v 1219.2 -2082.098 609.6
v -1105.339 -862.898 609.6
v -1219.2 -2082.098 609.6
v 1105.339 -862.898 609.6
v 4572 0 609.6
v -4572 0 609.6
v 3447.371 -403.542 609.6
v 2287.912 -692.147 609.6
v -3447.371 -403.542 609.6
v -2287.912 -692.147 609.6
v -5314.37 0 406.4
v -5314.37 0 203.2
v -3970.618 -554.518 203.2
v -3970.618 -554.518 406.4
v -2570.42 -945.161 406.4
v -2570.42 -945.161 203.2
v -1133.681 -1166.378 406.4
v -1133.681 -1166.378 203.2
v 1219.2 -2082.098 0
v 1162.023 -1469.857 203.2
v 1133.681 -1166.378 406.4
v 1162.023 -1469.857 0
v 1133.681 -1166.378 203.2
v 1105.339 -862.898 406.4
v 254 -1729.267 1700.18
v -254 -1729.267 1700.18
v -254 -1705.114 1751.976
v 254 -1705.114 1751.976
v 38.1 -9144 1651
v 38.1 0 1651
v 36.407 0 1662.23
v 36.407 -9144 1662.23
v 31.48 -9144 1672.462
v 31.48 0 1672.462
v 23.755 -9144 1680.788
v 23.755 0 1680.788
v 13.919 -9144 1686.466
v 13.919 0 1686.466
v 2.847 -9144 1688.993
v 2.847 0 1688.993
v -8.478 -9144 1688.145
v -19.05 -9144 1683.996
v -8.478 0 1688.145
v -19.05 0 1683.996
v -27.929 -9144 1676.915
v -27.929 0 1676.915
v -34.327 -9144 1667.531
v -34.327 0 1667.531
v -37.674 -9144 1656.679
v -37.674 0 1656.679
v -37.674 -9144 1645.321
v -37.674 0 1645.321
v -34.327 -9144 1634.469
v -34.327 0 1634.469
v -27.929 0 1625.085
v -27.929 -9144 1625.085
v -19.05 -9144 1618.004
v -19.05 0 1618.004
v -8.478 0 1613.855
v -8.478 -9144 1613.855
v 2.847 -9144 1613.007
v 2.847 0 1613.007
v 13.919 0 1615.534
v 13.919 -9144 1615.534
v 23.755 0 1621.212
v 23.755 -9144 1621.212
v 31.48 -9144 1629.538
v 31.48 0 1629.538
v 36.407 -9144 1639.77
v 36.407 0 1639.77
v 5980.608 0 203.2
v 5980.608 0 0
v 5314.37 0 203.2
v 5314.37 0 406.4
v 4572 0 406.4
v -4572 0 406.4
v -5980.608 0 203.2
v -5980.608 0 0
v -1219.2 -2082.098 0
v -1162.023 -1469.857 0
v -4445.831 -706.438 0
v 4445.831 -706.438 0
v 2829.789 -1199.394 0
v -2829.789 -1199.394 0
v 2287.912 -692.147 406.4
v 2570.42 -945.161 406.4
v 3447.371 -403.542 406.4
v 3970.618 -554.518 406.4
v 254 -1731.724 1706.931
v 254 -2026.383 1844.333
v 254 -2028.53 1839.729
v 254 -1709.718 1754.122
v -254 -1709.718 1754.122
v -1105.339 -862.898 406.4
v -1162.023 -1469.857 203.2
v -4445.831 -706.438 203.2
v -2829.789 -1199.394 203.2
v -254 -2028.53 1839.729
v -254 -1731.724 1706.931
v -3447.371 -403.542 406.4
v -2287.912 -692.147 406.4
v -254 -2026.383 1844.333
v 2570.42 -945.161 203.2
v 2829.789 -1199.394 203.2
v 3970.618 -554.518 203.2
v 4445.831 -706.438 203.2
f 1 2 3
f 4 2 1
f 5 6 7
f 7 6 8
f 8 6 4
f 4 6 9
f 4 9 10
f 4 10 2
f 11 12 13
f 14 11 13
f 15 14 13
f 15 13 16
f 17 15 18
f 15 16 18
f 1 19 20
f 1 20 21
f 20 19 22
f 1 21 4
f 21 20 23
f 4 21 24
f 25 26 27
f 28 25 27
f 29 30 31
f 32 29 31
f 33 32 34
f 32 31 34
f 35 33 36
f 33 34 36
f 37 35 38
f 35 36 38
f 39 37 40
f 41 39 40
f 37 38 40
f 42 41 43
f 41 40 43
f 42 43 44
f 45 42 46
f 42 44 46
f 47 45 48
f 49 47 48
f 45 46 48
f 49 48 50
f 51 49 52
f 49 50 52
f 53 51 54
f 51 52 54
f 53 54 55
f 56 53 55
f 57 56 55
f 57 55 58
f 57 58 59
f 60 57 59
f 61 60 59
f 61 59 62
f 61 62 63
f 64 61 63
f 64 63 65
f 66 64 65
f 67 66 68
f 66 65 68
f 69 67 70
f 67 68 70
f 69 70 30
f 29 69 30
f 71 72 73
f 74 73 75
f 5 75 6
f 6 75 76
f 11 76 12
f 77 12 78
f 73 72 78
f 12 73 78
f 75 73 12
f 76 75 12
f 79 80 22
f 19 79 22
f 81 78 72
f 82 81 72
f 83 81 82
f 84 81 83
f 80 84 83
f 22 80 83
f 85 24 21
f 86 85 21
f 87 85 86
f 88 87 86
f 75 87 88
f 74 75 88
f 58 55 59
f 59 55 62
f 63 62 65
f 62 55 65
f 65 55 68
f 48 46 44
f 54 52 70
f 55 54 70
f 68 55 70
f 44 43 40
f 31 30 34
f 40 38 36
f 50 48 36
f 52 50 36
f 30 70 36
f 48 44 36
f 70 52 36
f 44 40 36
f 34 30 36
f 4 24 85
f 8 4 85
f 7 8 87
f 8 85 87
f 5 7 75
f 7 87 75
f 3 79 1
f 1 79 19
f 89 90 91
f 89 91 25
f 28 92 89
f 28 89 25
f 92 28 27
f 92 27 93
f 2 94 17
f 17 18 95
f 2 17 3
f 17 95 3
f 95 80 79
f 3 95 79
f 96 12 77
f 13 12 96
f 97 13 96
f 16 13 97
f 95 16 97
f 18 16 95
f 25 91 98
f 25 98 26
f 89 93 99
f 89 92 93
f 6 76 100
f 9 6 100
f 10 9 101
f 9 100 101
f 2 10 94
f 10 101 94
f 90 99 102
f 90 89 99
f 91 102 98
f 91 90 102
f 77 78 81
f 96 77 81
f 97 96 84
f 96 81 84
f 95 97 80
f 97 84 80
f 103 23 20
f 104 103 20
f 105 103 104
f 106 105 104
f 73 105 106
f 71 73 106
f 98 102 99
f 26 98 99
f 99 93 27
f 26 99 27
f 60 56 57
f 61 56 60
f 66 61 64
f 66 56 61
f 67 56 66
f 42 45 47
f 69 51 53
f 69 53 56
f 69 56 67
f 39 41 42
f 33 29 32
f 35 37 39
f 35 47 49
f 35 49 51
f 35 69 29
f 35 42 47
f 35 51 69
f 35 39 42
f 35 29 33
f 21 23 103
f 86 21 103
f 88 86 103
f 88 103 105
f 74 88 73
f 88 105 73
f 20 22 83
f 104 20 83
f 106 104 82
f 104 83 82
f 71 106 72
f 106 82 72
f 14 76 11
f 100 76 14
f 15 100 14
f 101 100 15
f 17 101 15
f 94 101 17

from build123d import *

# Parameters (mm, degrees)
F1_DEPTH = 609.6
F2_DEPTH = 406.4
F3_DEPTH = 203.2
F5_DEPTH = 9144
F7_DEPTH = 254


with BuildPart() as f1:
    # F0 (on Top) → F1 (new body)
    with BuildSketch(Plane.XY):
        with BuildLine():
            Line((4572, 0), (-4572, 0))
            ThreePointArc((-4572, 0), (-2871.2700615902, -562.4213708024), (-1105.3386259367, -862.8981358098))
            ThreePointArc((-1105.3386259367, -862.8981358098), (0, -914.4), (1105.3386259367, -862.8981358098))
            ThreePointArc((1105.3386259367, -862.8981358098), (2871.2700615902, -562.4213708024), (4572, 0))
        make_face()
        with BuildLine():
            ThreePointArc((0, -1524), (-581.6416681815, -1510.4569151578), (-1162.0226580358, -1469.8570145693))
            Line((-1162.022658036, -1469.8570145693), (-1219.2, -2082.0981358098))
            Line((-1219.2, -2082.0981358098), (0, -2082.0981358098))
            Line((0, -2082.0981358098), (0, -1524))
        make_face()
        with BuildLine():
            Line((1219.2, -2082.0981358098), (1162.022658036, -1469.8570145693))
            ThreePointArc((1162.0226580358, -1469.8570145693), (581.6416681815, -1510.4569151578), (0, -1524))
            Line((0, -1524), (0, -2082.0981358098))
            Line((0, -2082.0981358098), (1219.2, -2082.0981358098))
        make_face()
        with BuildLine():
            ThreePointArc((1133.6806419859, -1166.3775751896), (0, -1219.2), (-1133.6806419859, -1166.3775751896))
            Line((-1133.6806419863, -1166.3775751896), (-1162.022658036, -1469.8570145693))
            ThreePointArc((-1162.0226580358, -1469.8570145693), (-581.6416681815, -1510.4569151578), (0, -1524))
            ThreePointArc((0, -1524), (581.6416681815, -1510.4569151578), (1162.0226580358, -1469.8570145693))
            Line((1162.022658036, -1469.8570145693), (1133.6806419863, -1166.3775751896))
        make_face()
        with BuildLine():
            ThreePointArc((1105.3386259367, -862.8981358098), (0, -914.4), (-1105.3386259367, -862.8981358098))
            Line((-1105.3386259367, -862.8981358098), (-1133.6806419863, -1166.3775751896))
            ThreePointArc((-1133.6806419859, -1166.3775751896), (0, -1219.2), (1133.6806419859, -1166.3775751896))
            Line((1133.6806419863, -1166.3775751896), (1105.3386259367, -862.8981358098))
        make_face()
    extrude(amount=F1_DEPTH)

    # F0 (on Top) → F2 (join)
    with BuildSketch(Plane.XY):
        with BuildLine():
            ThreePointArc((-1105.3386259367, -862.8981358098), (-2871.2700615902, -562.4213708024), (-4572, 0))
            Line((-4572, 0), (-5314.3695919648, 0))
            ThreePointArc((-5314.3695919648, 0), (-3276.3466112218, -770.7265948154), (-1133.6806419859, -1166.3775751896))
            Line((-1133.6806419863, -1166.3775751896), (-1105.3386259367, -862.8981358098))
        make_face()
        with BuildLine():
            Line((5314.3695919648, 0), (4572, 0))
            ThreePointArc((4572, 0), (2871.2700615902, -562.4213708024), (1105.3386259367, -862.8981358098))
            Line((1105.3386259367, -862.8981358098), (1133.6806419863, -1166.3775751896))
            ThreePointArc((1133.6806419859, -1166.3775751896), (3276.3466112218, -770.7265948154), (5314.3695919648, 0))
        make_face()
    extrude(amount=F2_DEPTH)

    # F0 (on Top) → F3 (join)
    with BuildSketch(Plane.XY):
        with BuildLine():
            ThreePointArc((-1133.6806419859, -1166.3775751896), (-3276.3466112218, -770.7265948154), (-5314.3695919648, 0))
            Line((-5314.3695919648, 0), (-5980.6078620822, 0))
            ThreePointArc((-5980.6078620822, 0), (-3646.1503805452, -980.2580874707), (-1162.0226580358, -1469.8570145693))
            Line((-1162.022658036, -1469.8570145693), (-1133.6806419863, -1166.3775751896))
        make_face()
        with BuildLine():
            Line((5980.6078620822, 0), (5314.3695919648, 0))
            ThreePointArc((5314.3695919648, 0), (3276.3466112218, -770.7265948154), (1133.6806419859, -1166.3775751896))
            Line((1133.6806419863, -1166.3775751896), (1162.022658036, -1469.8570145693))
            ThreePointArc((1162.0226580358, -1469.8570145693), (3646.1503805452, -980.2580874707), (5980.6078620822, 0))
        make_face()
    extrude(amount=F3_DEPTH)


with BuildPart() as f5:
    # F4 (on Front) → F5 (new body)
    with BuildSketch(Plane.XZ):
        with BuildLine():
            ThreePointArc((0, 1612.9), (26.9407683632, 1624.0592316368), (38.1, 1651))
            ThreePointArc((38.1, 1651), (-26.9407683632, 1677.9407683632), (0, 1612.9))
        make_face()
    extrude(amount=F5_DEPTH)


with BuildPart() as f7:
    # F6 (on Right) → F7 (new body, symmetric)
    with BuildSketch(Plane.YZ):
        Polygon((-2026.3826506799, 1844.3326886685), (-2028.5295514496, 1839.7286451103), (-1878.8981358098, 1769.9543700969), (-1729.2667201701, 1700.1800950835), (-1705.1140865116, 1751.9755851127), (-1709.7181300698, 1754.1224858823), (-1731.7238629586, 1706.9310394113), align=None)
    extrude(amount=F7_DEPTH, both=True)


solid = Compound([f1.part, f5.part, f7.part])
